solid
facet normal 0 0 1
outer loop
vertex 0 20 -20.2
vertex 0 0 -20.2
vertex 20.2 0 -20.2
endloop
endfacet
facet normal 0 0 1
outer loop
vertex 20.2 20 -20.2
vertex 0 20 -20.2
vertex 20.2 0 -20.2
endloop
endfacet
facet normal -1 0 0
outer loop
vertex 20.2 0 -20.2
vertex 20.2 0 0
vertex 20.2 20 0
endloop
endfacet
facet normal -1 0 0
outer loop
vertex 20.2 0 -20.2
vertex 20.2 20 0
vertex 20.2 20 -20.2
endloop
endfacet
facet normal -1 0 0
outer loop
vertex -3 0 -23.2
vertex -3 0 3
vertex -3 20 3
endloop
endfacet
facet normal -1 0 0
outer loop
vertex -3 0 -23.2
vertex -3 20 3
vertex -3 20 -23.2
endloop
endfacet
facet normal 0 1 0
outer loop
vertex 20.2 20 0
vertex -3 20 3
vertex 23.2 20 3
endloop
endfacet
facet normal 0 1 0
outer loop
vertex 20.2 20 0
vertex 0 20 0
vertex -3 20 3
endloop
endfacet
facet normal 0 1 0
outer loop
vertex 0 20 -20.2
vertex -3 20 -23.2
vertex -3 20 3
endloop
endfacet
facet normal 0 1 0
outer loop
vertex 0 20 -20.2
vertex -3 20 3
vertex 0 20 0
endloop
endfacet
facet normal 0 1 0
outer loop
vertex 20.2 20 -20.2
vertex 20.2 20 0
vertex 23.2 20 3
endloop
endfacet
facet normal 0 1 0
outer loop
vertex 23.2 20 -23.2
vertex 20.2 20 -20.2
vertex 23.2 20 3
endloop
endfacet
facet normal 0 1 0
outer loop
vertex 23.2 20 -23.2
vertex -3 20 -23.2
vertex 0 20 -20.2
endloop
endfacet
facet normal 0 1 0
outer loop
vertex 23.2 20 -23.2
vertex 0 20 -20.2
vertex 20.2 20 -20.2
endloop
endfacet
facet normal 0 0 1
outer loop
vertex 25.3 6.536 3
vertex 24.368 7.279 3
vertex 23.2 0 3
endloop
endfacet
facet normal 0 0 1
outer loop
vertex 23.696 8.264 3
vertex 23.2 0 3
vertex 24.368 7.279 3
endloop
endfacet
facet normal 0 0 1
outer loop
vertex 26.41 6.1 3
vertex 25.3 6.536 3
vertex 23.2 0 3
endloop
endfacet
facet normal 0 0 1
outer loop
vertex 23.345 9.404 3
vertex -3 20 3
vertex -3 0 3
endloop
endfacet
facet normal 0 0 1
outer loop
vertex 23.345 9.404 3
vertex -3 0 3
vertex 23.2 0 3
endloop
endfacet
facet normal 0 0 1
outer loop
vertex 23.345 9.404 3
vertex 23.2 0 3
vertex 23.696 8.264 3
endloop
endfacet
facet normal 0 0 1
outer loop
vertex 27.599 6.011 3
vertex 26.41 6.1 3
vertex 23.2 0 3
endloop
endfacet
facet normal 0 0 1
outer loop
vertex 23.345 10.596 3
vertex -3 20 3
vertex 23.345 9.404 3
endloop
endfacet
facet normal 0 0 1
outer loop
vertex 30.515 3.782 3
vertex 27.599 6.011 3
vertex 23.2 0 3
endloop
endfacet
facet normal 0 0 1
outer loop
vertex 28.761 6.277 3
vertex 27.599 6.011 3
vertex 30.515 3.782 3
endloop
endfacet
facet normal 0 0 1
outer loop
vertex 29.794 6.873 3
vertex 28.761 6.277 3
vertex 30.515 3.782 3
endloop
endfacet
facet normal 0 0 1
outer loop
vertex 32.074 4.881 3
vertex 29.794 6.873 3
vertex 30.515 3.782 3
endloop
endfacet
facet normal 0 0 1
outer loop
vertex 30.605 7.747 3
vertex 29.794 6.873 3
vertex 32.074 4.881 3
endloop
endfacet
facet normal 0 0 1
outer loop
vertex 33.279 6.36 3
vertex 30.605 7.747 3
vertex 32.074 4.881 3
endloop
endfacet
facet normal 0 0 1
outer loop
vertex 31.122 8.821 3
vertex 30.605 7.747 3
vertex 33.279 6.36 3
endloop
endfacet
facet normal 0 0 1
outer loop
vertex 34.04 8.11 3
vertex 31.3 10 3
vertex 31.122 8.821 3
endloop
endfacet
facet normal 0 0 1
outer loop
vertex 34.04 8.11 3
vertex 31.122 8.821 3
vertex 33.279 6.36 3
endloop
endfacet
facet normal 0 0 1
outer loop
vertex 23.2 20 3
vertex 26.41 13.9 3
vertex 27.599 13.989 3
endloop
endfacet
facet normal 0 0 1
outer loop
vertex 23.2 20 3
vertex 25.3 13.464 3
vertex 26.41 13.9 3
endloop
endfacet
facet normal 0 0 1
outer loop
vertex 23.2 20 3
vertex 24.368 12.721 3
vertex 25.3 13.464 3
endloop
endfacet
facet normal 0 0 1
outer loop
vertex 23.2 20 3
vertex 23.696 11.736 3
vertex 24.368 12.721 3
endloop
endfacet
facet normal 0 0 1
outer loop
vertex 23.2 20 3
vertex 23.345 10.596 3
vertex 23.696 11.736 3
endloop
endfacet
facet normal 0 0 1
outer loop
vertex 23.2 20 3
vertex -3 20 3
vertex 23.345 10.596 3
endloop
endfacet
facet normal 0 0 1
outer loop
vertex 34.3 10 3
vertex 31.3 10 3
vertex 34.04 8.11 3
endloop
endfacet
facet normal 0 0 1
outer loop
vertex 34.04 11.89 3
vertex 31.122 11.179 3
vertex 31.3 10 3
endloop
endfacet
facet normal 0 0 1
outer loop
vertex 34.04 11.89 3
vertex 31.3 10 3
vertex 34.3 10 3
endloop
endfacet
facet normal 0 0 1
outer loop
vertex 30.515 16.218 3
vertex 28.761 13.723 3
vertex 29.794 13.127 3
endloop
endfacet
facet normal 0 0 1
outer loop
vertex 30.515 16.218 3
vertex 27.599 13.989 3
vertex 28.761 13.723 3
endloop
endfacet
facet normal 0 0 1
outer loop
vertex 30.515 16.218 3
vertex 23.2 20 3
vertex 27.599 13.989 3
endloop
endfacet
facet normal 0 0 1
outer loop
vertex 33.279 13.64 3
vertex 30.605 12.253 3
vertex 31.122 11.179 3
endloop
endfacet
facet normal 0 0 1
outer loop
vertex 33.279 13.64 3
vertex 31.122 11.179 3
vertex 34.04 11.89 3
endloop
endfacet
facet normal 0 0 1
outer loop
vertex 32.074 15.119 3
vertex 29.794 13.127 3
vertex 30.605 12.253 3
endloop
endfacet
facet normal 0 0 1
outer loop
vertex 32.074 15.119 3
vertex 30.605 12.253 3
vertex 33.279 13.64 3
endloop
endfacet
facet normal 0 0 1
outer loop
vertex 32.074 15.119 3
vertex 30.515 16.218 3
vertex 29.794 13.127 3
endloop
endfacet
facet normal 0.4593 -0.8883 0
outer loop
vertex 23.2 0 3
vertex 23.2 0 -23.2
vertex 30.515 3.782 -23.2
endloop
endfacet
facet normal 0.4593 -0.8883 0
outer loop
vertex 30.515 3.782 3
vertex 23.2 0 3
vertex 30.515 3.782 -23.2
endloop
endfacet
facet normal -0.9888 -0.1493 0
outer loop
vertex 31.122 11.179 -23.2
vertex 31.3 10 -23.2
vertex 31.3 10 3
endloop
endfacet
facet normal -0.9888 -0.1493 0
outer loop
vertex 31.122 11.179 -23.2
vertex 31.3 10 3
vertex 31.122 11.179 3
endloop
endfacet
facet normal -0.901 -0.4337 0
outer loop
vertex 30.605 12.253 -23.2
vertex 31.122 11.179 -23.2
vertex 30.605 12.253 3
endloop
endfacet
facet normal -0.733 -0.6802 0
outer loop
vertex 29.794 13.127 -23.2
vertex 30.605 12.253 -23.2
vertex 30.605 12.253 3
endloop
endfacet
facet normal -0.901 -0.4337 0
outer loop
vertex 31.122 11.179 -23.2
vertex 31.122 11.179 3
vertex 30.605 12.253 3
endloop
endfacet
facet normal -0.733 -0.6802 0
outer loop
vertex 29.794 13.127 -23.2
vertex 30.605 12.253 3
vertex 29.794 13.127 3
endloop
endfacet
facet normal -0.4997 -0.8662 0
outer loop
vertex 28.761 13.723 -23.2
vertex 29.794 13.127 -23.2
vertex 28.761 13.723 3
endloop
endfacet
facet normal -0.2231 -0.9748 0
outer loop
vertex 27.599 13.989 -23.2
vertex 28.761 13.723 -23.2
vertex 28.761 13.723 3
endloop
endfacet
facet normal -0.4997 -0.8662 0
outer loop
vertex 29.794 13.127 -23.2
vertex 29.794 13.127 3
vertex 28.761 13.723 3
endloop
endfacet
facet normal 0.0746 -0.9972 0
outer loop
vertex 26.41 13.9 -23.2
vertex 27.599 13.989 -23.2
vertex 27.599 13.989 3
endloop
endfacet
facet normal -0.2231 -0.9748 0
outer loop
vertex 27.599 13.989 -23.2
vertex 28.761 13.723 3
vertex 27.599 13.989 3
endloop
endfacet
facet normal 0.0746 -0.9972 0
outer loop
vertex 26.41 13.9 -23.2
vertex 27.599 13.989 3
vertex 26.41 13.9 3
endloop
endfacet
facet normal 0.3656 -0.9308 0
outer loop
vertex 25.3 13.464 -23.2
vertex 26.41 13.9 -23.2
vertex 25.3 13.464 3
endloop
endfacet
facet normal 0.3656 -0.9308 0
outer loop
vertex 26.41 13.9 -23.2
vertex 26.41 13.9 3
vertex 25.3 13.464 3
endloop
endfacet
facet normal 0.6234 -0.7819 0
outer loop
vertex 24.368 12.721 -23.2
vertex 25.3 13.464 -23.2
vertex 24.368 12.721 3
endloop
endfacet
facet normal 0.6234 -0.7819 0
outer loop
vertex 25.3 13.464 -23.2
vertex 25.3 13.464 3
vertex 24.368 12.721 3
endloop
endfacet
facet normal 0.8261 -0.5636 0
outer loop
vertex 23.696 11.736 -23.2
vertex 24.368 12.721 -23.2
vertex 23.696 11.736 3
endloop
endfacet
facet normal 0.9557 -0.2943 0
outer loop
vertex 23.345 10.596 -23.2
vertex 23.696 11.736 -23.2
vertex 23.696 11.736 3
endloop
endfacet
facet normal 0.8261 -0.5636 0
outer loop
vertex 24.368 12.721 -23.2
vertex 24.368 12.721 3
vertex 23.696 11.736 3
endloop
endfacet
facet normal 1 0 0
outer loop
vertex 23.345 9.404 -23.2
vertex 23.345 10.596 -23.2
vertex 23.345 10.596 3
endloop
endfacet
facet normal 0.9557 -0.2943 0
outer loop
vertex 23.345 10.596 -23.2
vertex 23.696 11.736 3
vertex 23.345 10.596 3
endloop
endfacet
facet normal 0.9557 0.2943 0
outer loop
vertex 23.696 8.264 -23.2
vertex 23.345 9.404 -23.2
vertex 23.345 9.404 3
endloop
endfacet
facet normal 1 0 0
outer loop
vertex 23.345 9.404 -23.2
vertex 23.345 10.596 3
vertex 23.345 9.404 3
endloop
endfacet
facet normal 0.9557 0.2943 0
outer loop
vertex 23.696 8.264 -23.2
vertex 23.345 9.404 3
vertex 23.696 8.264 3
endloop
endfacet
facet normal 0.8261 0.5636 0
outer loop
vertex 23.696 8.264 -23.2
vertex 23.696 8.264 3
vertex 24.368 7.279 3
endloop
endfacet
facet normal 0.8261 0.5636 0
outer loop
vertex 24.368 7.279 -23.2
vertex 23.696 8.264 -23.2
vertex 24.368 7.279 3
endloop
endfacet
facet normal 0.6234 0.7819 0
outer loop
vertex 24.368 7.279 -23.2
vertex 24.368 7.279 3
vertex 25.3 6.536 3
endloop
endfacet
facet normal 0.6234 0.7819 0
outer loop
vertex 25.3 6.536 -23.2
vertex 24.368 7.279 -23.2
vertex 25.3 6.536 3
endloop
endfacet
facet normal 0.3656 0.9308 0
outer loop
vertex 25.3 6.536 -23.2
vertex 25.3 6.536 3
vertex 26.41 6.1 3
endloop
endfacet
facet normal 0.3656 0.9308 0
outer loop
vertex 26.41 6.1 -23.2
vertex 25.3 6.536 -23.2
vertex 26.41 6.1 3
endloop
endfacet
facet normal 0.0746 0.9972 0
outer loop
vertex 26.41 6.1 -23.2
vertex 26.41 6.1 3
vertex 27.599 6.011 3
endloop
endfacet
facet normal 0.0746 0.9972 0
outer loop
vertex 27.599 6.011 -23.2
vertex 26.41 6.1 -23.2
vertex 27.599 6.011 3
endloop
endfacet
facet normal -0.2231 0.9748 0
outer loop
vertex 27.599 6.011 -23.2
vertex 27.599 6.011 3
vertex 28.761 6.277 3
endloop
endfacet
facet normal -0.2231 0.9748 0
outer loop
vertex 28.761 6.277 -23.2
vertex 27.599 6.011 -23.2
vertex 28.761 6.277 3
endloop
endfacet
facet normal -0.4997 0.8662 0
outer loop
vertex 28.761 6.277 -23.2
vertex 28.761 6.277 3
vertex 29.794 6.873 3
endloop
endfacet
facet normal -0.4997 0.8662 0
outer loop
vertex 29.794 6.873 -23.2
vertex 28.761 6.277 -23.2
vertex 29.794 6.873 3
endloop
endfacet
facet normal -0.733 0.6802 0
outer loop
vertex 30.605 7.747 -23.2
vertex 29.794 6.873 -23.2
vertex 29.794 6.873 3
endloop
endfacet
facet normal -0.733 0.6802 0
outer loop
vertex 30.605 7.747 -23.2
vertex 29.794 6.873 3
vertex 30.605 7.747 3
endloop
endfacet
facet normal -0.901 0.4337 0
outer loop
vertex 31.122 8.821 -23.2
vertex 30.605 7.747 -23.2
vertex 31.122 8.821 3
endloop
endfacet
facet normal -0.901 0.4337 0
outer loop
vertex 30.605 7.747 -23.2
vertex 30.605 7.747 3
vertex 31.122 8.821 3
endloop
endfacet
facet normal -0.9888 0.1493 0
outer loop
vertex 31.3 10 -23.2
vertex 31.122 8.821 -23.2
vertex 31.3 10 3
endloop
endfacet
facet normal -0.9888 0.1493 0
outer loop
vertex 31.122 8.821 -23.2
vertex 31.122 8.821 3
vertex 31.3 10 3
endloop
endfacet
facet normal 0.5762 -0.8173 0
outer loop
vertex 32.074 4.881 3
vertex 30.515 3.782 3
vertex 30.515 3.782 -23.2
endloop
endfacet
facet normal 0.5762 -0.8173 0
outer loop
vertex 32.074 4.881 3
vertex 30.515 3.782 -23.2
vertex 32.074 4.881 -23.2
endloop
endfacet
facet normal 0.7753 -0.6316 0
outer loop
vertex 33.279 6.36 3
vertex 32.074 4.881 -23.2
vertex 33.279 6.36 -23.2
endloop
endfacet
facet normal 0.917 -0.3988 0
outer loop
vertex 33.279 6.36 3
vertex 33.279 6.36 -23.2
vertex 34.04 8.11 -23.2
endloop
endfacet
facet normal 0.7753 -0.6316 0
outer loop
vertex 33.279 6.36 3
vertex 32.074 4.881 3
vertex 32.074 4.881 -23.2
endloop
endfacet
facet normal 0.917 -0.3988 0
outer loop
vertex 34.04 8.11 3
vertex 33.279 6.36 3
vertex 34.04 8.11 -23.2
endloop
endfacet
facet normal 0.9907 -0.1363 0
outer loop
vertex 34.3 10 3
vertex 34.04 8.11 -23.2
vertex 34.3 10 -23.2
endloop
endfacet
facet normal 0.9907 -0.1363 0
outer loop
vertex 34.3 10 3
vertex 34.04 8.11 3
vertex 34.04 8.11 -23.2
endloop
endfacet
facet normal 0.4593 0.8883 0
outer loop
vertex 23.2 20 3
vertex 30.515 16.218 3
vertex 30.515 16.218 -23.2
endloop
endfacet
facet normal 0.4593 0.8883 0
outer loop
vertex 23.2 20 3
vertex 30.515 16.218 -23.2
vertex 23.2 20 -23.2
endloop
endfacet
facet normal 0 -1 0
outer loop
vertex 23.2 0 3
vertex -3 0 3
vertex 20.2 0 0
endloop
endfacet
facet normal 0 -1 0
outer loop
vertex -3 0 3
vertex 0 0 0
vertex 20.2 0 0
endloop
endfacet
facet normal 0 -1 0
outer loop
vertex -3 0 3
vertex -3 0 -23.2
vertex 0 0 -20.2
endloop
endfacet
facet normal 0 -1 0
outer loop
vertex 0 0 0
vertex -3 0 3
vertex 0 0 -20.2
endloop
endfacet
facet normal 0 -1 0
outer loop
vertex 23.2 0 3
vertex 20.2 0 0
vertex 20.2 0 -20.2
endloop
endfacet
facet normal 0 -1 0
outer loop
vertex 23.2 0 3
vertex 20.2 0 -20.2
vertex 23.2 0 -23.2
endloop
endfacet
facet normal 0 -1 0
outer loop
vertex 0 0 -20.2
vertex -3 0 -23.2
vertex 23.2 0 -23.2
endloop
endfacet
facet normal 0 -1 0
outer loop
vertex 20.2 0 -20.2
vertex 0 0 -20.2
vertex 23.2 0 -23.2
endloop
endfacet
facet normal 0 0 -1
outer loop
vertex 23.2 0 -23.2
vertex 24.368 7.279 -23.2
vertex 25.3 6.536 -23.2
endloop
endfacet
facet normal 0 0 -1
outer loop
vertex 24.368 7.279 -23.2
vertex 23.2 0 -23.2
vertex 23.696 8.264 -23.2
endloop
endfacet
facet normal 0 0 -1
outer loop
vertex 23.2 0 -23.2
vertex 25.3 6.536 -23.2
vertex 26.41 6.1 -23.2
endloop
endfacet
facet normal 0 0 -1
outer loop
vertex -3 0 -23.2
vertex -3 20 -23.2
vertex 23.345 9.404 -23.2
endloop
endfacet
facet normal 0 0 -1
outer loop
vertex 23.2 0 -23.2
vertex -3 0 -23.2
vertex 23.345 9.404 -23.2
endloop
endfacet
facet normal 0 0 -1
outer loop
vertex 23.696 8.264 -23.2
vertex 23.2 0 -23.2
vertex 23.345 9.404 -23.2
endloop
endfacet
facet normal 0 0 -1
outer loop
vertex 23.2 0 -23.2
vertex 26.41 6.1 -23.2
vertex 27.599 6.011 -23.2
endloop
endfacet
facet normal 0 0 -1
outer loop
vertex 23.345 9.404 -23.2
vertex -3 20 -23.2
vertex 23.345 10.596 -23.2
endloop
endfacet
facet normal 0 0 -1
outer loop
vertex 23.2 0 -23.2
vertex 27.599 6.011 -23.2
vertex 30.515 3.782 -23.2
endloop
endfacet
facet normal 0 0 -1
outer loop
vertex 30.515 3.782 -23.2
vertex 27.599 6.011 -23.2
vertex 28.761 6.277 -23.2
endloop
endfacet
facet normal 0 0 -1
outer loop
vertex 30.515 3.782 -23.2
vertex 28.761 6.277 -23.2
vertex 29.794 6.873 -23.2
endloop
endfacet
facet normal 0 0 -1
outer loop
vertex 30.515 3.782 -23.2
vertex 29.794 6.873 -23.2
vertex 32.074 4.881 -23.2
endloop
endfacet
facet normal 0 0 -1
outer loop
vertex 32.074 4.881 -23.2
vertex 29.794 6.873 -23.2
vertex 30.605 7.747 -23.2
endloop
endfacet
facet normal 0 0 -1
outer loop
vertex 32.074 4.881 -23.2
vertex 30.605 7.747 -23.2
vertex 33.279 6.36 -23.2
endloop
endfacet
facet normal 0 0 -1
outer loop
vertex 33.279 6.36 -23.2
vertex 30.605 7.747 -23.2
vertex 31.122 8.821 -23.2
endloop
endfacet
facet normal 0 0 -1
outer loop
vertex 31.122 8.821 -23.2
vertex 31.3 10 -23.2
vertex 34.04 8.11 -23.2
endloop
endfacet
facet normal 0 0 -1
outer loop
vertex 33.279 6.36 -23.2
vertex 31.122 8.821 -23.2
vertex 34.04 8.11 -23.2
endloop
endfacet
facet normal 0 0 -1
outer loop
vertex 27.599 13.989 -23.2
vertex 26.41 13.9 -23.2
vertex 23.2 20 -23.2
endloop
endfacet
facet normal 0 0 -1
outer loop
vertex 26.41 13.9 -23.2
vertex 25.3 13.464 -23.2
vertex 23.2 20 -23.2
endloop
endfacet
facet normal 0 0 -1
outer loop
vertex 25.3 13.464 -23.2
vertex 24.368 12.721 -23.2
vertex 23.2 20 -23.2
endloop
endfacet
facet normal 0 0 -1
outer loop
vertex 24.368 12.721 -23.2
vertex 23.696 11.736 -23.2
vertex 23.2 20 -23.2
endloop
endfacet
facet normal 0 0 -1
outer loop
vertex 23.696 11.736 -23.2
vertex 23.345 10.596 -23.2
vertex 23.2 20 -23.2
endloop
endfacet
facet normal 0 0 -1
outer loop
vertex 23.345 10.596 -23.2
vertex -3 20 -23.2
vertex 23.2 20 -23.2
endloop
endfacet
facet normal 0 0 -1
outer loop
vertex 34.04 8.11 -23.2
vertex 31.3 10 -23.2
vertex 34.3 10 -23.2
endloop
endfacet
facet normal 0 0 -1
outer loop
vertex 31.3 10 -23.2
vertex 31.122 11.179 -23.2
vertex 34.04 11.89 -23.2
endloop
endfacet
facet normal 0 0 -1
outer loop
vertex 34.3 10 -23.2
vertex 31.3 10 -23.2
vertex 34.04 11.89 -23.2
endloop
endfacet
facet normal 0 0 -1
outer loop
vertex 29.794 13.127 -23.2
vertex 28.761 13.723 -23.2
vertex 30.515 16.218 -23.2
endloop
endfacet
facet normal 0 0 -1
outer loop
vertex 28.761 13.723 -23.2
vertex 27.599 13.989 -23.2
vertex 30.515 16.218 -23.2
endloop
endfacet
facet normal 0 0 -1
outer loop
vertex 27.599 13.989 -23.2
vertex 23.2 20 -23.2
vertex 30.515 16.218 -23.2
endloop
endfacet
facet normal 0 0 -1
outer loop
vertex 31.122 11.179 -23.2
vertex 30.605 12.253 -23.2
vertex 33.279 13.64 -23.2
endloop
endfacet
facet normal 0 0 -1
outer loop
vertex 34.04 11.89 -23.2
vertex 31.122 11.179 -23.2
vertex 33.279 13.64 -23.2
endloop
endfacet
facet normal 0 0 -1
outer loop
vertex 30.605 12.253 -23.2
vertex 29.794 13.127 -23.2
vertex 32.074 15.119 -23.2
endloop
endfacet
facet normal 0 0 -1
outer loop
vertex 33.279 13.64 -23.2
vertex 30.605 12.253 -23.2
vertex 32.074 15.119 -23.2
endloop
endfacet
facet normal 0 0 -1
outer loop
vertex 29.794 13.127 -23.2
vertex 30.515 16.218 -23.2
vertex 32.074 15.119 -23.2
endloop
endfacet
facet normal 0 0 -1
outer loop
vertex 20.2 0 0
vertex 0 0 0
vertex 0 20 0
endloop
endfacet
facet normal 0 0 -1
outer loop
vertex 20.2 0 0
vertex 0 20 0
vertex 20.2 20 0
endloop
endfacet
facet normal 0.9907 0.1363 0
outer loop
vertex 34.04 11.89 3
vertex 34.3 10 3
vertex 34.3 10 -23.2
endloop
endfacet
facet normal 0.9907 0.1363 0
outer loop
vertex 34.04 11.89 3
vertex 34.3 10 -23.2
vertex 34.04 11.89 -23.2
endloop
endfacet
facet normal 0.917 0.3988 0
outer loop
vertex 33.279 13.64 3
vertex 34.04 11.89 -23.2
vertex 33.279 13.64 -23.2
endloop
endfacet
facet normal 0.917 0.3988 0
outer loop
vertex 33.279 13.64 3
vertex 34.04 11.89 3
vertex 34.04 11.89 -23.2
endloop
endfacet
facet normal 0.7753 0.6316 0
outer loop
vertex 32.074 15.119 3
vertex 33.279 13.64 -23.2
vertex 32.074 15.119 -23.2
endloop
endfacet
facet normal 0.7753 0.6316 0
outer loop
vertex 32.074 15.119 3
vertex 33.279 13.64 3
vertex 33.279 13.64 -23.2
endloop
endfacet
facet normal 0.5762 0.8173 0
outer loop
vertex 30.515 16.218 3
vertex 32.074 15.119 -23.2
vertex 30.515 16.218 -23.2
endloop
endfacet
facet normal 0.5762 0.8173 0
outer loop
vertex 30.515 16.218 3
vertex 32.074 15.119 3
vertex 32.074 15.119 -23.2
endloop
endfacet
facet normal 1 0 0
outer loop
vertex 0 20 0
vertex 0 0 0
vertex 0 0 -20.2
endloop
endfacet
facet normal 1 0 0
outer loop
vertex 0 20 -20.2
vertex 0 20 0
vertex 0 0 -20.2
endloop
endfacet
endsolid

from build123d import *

# Parameters (mm, degrees)
SKETCH1_W           = 26.2
SKETCH1_H           = 26.2
SKETCH1_W_2         = 20.2
SKETCH1_H_2         = 20.2
BOSS_EXTRUDE1_DEPTH = 20
SKETCH2_R           = 4
BOSS_EXTRUDE4_DEPTH = 26.2


with BuildPart() as part:
    # Sketch1 → Boss-Extrude1 (new body)
    with BuildSketch(Plane(origin=(0, 0, 0), x_dir=(1, 0, 0), z_dir=(0, 1, 0))):
        with Locations((10.1, 10.1)):
            Rectangle(SKETCH1_W, SKETCH1_H)
        with Locations((10.1, 10.1)):
            Rectangle(SKETCH1_W_2, SKETCH1_H_2, mode=Mode.SUBTRACT)
    extrude(amount=BOSS_EXTRUDE1_DEPTH)

    # Sketch2 → Boss-Extrude4 (add)
    # profile 1 of 3: a face of its own
    with BuildSketch(Plane.XY.offset(3)):
        with BuildLine():
            ThreePointArc((34.3, 10), (33.279298444, 13.639778856), (30.514859965, 16.218092586))
            ThreePointArc((30.514859965, 16.218092586), (26.780404048, 16.980689081), (23.2, 15.673623181))
            Line((23.2, 15.673623181), (23.2, 4.326376819))
            ThreePointArc((23.2, 4.326376819), (26.780404048, 3.019310919), (30.514859965, 3.781907414))
            ThreePointArc((30.514859965, 3.781907414), (33.279298444, 6.360221144), (34.3, 10))
        make_face()
        with Locations((27.3, 10)):
            Circle(SKETCH2_R, mode=Mode.SUBTRACT)
    # profile 2 of 3: a face of its own
    with BuildSketch(Plane.XY.offset(3)):
        with BuildLine():
            Line((30.514859965, 16.218092586), (23.2, 20))
            Line((23.2, 20), (23.2, 15.673623181))
            ThreePointArc((23.2, 15.673623181), (26.780404048, 16.980689081), (30.514859965, 16.218092586))
        make_face()
    # profile 3 of 3: a face of its own
    with BuildSketch(Plane.XY.offset(3)):
        with BuildLine():
            ThreePointArc((30.514859965, 3.781907414), (26.780404048, 3.019310919), (23.2, 4.326376819))
            Line((23.2, 4.326376819), (23.2, 0))
            Line((23.2, 0), (30.514859965, 3.781907414))
        make_face()
    extrude(amount=-BOSS_EXTRUDE4_DEPTH)


solid = part.part
